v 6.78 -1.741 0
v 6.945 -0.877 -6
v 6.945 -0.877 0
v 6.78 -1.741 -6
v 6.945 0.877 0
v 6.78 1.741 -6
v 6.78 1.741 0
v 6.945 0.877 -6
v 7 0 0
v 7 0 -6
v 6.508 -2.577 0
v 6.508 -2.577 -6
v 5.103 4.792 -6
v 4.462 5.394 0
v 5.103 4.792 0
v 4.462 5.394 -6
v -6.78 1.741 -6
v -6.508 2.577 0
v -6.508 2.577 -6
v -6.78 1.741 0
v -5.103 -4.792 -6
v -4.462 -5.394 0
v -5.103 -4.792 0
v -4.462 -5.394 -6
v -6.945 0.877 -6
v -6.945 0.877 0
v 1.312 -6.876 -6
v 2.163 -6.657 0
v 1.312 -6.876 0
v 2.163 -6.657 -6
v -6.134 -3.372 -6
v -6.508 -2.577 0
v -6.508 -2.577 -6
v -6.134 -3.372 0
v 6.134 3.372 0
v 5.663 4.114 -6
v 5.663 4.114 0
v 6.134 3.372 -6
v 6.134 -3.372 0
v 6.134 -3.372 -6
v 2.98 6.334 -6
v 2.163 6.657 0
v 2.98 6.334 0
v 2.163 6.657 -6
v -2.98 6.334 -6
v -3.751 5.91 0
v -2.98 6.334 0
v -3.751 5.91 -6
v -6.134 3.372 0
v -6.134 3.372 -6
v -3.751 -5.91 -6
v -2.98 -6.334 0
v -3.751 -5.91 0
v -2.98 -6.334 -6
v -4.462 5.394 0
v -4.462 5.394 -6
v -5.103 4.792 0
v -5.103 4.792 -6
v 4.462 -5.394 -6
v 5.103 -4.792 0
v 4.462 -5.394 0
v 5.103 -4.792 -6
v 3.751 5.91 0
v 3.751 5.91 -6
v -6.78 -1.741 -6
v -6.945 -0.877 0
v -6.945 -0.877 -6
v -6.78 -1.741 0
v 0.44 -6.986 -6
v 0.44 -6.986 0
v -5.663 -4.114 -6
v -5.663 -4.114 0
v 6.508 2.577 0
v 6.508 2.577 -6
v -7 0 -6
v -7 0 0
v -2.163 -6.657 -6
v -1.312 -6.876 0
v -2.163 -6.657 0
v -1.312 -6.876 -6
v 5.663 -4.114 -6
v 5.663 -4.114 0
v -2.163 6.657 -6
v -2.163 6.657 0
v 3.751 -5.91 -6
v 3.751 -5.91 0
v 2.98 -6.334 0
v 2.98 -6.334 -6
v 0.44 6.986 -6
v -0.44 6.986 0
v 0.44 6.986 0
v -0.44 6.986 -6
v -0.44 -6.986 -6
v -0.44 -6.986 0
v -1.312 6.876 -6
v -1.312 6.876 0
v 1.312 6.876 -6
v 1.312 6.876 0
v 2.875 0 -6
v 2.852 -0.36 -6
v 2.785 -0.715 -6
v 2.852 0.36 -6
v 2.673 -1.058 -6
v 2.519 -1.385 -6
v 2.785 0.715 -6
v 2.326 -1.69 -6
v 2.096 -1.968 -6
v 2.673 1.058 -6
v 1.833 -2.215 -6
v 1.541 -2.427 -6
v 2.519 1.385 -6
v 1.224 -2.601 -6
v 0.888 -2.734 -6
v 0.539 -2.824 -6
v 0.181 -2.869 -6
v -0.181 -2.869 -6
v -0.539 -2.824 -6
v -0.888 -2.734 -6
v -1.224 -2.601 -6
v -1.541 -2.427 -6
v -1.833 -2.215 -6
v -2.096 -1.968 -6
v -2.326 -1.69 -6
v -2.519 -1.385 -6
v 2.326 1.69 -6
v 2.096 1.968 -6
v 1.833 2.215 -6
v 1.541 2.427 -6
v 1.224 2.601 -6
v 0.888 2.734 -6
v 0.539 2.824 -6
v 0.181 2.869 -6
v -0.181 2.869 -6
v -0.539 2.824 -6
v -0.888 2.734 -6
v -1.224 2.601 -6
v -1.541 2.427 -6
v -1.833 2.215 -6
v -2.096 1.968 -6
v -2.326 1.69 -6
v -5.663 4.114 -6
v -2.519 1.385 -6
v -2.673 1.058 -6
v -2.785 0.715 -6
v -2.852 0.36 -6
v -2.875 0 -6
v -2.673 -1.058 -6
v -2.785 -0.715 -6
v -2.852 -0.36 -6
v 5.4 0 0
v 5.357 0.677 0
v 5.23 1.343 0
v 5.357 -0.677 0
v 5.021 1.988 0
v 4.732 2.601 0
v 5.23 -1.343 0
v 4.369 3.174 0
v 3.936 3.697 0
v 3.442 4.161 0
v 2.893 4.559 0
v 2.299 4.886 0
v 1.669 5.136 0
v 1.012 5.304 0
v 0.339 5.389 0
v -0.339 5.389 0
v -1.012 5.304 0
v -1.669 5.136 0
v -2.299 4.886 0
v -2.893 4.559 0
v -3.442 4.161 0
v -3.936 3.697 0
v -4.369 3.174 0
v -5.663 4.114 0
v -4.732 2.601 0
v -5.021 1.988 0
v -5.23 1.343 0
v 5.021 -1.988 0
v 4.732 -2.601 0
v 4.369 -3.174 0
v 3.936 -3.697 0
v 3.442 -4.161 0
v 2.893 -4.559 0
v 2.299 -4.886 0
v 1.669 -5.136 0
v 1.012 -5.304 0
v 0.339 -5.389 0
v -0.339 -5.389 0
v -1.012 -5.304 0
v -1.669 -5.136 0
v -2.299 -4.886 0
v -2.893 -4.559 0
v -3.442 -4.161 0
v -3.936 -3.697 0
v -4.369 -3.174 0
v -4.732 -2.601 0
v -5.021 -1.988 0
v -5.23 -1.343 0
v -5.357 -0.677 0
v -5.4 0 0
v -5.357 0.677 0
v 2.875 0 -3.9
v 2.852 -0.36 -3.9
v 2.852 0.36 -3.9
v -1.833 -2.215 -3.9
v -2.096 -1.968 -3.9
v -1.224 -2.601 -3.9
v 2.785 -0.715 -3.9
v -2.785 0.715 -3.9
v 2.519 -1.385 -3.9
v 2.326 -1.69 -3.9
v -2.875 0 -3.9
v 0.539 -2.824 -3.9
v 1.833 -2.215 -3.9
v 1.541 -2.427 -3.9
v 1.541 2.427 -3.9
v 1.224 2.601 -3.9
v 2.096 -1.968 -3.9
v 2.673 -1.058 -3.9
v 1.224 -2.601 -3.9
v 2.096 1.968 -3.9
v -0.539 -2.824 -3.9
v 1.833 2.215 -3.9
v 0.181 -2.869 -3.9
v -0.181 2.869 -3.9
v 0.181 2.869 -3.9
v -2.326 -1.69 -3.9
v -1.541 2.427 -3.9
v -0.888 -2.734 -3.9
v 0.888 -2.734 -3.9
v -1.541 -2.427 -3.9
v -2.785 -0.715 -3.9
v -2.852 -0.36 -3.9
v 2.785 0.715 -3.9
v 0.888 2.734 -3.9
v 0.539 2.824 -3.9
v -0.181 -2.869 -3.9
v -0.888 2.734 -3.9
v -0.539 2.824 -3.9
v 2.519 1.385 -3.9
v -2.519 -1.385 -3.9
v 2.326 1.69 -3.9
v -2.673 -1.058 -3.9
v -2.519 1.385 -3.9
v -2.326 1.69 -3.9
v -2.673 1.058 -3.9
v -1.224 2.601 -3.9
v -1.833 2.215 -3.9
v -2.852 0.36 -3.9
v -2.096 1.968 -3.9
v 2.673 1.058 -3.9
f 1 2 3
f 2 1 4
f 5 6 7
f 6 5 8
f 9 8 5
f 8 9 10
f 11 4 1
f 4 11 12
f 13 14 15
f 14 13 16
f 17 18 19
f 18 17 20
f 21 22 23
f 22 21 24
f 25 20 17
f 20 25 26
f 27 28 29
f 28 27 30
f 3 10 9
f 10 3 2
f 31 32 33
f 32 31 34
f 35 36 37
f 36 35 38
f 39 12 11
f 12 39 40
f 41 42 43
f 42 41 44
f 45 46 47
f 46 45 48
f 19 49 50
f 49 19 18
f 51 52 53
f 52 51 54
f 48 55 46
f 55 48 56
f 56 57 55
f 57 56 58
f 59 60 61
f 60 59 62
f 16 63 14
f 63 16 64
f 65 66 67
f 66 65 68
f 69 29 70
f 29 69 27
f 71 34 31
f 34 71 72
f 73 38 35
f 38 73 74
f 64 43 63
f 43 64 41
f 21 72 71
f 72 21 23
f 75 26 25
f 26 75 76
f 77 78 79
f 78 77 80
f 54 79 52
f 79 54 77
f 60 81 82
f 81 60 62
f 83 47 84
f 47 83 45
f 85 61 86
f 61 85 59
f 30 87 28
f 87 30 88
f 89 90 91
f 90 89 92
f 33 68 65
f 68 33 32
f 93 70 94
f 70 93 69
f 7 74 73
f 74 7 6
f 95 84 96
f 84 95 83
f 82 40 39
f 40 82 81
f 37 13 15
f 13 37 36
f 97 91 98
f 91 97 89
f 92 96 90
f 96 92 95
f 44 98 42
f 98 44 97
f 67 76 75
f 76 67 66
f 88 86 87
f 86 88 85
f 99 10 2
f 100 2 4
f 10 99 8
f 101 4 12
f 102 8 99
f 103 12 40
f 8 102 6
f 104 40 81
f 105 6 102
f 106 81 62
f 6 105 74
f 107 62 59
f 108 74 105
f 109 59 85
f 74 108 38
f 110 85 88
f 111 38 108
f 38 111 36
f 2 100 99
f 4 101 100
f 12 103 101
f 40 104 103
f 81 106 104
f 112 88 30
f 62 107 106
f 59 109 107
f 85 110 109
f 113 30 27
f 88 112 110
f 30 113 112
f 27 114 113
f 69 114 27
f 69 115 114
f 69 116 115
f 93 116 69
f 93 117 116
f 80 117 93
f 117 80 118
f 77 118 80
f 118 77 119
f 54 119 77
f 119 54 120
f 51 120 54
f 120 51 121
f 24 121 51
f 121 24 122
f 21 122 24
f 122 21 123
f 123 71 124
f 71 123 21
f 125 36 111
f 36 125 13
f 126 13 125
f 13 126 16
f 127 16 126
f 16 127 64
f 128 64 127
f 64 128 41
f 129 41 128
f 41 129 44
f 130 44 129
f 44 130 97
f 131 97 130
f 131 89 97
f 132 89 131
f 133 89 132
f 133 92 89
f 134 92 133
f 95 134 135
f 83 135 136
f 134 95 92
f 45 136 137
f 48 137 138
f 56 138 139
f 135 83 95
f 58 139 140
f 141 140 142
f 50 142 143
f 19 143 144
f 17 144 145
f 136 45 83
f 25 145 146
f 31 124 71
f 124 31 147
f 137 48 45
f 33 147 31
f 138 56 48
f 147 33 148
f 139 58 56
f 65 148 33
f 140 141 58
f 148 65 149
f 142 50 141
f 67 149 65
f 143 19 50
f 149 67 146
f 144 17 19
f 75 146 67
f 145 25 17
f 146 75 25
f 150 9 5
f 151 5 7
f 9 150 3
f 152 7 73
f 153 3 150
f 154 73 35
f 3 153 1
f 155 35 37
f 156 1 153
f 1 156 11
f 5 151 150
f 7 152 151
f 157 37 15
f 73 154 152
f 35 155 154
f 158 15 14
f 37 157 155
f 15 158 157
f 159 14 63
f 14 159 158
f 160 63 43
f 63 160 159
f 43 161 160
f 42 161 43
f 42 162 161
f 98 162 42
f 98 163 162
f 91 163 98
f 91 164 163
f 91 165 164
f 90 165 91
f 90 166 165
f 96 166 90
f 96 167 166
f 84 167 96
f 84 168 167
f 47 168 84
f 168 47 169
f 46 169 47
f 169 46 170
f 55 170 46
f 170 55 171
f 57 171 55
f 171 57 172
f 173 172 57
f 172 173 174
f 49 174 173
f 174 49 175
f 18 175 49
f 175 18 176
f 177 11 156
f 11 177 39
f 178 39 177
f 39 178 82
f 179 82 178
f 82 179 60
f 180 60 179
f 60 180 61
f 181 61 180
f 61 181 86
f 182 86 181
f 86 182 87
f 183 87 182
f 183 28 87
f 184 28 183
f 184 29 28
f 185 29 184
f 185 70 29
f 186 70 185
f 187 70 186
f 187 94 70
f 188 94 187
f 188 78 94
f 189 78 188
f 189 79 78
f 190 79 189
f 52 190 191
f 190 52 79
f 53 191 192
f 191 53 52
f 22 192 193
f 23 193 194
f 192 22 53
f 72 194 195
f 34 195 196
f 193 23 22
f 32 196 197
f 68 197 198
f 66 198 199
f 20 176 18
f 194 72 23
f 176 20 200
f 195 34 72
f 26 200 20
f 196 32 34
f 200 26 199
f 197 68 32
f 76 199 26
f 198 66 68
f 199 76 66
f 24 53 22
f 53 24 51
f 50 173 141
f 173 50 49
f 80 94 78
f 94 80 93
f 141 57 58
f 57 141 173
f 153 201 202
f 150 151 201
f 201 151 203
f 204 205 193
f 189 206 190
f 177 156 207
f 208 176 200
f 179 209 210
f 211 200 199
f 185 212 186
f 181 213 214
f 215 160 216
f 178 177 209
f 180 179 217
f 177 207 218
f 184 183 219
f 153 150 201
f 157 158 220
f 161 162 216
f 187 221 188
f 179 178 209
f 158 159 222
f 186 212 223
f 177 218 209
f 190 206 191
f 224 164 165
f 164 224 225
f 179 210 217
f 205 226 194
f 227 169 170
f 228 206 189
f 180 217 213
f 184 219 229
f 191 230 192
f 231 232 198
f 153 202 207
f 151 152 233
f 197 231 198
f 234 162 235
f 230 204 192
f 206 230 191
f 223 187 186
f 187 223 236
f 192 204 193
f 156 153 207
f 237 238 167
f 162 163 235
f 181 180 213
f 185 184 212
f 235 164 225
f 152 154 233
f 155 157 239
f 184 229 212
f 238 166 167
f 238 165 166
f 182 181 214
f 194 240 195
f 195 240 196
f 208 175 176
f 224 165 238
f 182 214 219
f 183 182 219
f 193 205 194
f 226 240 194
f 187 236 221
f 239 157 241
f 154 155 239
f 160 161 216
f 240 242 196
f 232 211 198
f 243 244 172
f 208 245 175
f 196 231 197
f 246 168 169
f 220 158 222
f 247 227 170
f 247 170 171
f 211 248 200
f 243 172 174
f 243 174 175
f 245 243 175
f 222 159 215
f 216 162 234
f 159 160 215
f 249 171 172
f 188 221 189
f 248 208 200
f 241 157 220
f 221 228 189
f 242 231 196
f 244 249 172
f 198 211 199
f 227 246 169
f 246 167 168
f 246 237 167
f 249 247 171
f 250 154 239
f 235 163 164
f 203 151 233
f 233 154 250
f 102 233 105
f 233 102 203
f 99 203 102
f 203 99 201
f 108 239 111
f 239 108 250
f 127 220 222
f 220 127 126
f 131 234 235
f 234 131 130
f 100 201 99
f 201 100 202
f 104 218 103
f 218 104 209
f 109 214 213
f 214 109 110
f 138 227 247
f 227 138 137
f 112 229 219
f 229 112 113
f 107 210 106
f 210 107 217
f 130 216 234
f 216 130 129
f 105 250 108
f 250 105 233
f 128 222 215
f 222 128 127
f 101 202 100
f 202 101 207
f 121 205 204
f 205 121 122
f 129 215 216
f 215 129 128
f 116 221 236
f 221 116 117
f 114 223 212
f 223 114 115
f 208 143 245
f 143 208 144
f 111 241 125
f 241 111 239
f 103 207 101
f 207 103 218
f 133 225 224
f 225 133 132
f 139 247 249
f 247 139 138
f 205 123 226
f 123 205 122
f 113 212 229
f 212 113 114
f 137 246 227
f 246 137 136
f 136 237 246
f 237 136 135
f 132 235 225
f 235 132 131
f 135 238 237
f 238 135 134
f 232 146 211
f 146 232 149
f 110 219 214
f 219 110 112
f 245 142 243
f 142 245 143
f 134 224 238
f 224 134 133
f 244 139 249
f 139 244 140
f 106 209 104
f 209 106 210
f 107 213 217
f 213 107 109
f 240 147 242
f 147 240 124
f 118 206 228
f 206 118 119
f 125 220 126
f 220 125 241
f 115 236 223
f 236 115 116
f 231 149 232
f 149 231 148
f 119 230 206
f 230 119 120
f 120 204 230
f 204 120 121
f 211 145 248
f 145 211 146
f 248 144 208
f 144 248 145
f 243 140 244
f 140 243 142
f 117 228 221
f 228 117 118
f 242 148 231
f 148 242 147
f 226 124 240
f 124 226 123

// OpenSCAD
$fn = 50;


difference() {
	union() {
		translate(v = [0, 0, -6.0000000000]) {
			cylinder(h = 6, r = 7.0000000000);
		}
		translate(v = [0, 0, -6.0000000000]) {
			cylinder(h = 6, r = 2.8750000000);
		}
	}
	union() {
		translate(v = [0, 0, 0]) {
			rotate(a = [0, 0, 0]) {
				difference() {
					union() {
						translate(v = [0, 0, -6.0000000000]) {
							cylinder(h = 6, r = 2.6000000000);
						}
						translate(v = [0, 0, -3.9000000000]) {
							cylinder(h = 3.9000000000, r1 = 2.8750000000, r2 = 5.4000000000);
						}
						translate(v = [0, 0, -6.0000000000]) {
							cylinder(h = 6, r = 2.8750000000);
						}
						translate(v = [0, 0, -6.0000000000]) {
							cylinder(h = 6, r = 2.6000000000);
						}
					}
					union();
				}
			}
		}
	}
}
